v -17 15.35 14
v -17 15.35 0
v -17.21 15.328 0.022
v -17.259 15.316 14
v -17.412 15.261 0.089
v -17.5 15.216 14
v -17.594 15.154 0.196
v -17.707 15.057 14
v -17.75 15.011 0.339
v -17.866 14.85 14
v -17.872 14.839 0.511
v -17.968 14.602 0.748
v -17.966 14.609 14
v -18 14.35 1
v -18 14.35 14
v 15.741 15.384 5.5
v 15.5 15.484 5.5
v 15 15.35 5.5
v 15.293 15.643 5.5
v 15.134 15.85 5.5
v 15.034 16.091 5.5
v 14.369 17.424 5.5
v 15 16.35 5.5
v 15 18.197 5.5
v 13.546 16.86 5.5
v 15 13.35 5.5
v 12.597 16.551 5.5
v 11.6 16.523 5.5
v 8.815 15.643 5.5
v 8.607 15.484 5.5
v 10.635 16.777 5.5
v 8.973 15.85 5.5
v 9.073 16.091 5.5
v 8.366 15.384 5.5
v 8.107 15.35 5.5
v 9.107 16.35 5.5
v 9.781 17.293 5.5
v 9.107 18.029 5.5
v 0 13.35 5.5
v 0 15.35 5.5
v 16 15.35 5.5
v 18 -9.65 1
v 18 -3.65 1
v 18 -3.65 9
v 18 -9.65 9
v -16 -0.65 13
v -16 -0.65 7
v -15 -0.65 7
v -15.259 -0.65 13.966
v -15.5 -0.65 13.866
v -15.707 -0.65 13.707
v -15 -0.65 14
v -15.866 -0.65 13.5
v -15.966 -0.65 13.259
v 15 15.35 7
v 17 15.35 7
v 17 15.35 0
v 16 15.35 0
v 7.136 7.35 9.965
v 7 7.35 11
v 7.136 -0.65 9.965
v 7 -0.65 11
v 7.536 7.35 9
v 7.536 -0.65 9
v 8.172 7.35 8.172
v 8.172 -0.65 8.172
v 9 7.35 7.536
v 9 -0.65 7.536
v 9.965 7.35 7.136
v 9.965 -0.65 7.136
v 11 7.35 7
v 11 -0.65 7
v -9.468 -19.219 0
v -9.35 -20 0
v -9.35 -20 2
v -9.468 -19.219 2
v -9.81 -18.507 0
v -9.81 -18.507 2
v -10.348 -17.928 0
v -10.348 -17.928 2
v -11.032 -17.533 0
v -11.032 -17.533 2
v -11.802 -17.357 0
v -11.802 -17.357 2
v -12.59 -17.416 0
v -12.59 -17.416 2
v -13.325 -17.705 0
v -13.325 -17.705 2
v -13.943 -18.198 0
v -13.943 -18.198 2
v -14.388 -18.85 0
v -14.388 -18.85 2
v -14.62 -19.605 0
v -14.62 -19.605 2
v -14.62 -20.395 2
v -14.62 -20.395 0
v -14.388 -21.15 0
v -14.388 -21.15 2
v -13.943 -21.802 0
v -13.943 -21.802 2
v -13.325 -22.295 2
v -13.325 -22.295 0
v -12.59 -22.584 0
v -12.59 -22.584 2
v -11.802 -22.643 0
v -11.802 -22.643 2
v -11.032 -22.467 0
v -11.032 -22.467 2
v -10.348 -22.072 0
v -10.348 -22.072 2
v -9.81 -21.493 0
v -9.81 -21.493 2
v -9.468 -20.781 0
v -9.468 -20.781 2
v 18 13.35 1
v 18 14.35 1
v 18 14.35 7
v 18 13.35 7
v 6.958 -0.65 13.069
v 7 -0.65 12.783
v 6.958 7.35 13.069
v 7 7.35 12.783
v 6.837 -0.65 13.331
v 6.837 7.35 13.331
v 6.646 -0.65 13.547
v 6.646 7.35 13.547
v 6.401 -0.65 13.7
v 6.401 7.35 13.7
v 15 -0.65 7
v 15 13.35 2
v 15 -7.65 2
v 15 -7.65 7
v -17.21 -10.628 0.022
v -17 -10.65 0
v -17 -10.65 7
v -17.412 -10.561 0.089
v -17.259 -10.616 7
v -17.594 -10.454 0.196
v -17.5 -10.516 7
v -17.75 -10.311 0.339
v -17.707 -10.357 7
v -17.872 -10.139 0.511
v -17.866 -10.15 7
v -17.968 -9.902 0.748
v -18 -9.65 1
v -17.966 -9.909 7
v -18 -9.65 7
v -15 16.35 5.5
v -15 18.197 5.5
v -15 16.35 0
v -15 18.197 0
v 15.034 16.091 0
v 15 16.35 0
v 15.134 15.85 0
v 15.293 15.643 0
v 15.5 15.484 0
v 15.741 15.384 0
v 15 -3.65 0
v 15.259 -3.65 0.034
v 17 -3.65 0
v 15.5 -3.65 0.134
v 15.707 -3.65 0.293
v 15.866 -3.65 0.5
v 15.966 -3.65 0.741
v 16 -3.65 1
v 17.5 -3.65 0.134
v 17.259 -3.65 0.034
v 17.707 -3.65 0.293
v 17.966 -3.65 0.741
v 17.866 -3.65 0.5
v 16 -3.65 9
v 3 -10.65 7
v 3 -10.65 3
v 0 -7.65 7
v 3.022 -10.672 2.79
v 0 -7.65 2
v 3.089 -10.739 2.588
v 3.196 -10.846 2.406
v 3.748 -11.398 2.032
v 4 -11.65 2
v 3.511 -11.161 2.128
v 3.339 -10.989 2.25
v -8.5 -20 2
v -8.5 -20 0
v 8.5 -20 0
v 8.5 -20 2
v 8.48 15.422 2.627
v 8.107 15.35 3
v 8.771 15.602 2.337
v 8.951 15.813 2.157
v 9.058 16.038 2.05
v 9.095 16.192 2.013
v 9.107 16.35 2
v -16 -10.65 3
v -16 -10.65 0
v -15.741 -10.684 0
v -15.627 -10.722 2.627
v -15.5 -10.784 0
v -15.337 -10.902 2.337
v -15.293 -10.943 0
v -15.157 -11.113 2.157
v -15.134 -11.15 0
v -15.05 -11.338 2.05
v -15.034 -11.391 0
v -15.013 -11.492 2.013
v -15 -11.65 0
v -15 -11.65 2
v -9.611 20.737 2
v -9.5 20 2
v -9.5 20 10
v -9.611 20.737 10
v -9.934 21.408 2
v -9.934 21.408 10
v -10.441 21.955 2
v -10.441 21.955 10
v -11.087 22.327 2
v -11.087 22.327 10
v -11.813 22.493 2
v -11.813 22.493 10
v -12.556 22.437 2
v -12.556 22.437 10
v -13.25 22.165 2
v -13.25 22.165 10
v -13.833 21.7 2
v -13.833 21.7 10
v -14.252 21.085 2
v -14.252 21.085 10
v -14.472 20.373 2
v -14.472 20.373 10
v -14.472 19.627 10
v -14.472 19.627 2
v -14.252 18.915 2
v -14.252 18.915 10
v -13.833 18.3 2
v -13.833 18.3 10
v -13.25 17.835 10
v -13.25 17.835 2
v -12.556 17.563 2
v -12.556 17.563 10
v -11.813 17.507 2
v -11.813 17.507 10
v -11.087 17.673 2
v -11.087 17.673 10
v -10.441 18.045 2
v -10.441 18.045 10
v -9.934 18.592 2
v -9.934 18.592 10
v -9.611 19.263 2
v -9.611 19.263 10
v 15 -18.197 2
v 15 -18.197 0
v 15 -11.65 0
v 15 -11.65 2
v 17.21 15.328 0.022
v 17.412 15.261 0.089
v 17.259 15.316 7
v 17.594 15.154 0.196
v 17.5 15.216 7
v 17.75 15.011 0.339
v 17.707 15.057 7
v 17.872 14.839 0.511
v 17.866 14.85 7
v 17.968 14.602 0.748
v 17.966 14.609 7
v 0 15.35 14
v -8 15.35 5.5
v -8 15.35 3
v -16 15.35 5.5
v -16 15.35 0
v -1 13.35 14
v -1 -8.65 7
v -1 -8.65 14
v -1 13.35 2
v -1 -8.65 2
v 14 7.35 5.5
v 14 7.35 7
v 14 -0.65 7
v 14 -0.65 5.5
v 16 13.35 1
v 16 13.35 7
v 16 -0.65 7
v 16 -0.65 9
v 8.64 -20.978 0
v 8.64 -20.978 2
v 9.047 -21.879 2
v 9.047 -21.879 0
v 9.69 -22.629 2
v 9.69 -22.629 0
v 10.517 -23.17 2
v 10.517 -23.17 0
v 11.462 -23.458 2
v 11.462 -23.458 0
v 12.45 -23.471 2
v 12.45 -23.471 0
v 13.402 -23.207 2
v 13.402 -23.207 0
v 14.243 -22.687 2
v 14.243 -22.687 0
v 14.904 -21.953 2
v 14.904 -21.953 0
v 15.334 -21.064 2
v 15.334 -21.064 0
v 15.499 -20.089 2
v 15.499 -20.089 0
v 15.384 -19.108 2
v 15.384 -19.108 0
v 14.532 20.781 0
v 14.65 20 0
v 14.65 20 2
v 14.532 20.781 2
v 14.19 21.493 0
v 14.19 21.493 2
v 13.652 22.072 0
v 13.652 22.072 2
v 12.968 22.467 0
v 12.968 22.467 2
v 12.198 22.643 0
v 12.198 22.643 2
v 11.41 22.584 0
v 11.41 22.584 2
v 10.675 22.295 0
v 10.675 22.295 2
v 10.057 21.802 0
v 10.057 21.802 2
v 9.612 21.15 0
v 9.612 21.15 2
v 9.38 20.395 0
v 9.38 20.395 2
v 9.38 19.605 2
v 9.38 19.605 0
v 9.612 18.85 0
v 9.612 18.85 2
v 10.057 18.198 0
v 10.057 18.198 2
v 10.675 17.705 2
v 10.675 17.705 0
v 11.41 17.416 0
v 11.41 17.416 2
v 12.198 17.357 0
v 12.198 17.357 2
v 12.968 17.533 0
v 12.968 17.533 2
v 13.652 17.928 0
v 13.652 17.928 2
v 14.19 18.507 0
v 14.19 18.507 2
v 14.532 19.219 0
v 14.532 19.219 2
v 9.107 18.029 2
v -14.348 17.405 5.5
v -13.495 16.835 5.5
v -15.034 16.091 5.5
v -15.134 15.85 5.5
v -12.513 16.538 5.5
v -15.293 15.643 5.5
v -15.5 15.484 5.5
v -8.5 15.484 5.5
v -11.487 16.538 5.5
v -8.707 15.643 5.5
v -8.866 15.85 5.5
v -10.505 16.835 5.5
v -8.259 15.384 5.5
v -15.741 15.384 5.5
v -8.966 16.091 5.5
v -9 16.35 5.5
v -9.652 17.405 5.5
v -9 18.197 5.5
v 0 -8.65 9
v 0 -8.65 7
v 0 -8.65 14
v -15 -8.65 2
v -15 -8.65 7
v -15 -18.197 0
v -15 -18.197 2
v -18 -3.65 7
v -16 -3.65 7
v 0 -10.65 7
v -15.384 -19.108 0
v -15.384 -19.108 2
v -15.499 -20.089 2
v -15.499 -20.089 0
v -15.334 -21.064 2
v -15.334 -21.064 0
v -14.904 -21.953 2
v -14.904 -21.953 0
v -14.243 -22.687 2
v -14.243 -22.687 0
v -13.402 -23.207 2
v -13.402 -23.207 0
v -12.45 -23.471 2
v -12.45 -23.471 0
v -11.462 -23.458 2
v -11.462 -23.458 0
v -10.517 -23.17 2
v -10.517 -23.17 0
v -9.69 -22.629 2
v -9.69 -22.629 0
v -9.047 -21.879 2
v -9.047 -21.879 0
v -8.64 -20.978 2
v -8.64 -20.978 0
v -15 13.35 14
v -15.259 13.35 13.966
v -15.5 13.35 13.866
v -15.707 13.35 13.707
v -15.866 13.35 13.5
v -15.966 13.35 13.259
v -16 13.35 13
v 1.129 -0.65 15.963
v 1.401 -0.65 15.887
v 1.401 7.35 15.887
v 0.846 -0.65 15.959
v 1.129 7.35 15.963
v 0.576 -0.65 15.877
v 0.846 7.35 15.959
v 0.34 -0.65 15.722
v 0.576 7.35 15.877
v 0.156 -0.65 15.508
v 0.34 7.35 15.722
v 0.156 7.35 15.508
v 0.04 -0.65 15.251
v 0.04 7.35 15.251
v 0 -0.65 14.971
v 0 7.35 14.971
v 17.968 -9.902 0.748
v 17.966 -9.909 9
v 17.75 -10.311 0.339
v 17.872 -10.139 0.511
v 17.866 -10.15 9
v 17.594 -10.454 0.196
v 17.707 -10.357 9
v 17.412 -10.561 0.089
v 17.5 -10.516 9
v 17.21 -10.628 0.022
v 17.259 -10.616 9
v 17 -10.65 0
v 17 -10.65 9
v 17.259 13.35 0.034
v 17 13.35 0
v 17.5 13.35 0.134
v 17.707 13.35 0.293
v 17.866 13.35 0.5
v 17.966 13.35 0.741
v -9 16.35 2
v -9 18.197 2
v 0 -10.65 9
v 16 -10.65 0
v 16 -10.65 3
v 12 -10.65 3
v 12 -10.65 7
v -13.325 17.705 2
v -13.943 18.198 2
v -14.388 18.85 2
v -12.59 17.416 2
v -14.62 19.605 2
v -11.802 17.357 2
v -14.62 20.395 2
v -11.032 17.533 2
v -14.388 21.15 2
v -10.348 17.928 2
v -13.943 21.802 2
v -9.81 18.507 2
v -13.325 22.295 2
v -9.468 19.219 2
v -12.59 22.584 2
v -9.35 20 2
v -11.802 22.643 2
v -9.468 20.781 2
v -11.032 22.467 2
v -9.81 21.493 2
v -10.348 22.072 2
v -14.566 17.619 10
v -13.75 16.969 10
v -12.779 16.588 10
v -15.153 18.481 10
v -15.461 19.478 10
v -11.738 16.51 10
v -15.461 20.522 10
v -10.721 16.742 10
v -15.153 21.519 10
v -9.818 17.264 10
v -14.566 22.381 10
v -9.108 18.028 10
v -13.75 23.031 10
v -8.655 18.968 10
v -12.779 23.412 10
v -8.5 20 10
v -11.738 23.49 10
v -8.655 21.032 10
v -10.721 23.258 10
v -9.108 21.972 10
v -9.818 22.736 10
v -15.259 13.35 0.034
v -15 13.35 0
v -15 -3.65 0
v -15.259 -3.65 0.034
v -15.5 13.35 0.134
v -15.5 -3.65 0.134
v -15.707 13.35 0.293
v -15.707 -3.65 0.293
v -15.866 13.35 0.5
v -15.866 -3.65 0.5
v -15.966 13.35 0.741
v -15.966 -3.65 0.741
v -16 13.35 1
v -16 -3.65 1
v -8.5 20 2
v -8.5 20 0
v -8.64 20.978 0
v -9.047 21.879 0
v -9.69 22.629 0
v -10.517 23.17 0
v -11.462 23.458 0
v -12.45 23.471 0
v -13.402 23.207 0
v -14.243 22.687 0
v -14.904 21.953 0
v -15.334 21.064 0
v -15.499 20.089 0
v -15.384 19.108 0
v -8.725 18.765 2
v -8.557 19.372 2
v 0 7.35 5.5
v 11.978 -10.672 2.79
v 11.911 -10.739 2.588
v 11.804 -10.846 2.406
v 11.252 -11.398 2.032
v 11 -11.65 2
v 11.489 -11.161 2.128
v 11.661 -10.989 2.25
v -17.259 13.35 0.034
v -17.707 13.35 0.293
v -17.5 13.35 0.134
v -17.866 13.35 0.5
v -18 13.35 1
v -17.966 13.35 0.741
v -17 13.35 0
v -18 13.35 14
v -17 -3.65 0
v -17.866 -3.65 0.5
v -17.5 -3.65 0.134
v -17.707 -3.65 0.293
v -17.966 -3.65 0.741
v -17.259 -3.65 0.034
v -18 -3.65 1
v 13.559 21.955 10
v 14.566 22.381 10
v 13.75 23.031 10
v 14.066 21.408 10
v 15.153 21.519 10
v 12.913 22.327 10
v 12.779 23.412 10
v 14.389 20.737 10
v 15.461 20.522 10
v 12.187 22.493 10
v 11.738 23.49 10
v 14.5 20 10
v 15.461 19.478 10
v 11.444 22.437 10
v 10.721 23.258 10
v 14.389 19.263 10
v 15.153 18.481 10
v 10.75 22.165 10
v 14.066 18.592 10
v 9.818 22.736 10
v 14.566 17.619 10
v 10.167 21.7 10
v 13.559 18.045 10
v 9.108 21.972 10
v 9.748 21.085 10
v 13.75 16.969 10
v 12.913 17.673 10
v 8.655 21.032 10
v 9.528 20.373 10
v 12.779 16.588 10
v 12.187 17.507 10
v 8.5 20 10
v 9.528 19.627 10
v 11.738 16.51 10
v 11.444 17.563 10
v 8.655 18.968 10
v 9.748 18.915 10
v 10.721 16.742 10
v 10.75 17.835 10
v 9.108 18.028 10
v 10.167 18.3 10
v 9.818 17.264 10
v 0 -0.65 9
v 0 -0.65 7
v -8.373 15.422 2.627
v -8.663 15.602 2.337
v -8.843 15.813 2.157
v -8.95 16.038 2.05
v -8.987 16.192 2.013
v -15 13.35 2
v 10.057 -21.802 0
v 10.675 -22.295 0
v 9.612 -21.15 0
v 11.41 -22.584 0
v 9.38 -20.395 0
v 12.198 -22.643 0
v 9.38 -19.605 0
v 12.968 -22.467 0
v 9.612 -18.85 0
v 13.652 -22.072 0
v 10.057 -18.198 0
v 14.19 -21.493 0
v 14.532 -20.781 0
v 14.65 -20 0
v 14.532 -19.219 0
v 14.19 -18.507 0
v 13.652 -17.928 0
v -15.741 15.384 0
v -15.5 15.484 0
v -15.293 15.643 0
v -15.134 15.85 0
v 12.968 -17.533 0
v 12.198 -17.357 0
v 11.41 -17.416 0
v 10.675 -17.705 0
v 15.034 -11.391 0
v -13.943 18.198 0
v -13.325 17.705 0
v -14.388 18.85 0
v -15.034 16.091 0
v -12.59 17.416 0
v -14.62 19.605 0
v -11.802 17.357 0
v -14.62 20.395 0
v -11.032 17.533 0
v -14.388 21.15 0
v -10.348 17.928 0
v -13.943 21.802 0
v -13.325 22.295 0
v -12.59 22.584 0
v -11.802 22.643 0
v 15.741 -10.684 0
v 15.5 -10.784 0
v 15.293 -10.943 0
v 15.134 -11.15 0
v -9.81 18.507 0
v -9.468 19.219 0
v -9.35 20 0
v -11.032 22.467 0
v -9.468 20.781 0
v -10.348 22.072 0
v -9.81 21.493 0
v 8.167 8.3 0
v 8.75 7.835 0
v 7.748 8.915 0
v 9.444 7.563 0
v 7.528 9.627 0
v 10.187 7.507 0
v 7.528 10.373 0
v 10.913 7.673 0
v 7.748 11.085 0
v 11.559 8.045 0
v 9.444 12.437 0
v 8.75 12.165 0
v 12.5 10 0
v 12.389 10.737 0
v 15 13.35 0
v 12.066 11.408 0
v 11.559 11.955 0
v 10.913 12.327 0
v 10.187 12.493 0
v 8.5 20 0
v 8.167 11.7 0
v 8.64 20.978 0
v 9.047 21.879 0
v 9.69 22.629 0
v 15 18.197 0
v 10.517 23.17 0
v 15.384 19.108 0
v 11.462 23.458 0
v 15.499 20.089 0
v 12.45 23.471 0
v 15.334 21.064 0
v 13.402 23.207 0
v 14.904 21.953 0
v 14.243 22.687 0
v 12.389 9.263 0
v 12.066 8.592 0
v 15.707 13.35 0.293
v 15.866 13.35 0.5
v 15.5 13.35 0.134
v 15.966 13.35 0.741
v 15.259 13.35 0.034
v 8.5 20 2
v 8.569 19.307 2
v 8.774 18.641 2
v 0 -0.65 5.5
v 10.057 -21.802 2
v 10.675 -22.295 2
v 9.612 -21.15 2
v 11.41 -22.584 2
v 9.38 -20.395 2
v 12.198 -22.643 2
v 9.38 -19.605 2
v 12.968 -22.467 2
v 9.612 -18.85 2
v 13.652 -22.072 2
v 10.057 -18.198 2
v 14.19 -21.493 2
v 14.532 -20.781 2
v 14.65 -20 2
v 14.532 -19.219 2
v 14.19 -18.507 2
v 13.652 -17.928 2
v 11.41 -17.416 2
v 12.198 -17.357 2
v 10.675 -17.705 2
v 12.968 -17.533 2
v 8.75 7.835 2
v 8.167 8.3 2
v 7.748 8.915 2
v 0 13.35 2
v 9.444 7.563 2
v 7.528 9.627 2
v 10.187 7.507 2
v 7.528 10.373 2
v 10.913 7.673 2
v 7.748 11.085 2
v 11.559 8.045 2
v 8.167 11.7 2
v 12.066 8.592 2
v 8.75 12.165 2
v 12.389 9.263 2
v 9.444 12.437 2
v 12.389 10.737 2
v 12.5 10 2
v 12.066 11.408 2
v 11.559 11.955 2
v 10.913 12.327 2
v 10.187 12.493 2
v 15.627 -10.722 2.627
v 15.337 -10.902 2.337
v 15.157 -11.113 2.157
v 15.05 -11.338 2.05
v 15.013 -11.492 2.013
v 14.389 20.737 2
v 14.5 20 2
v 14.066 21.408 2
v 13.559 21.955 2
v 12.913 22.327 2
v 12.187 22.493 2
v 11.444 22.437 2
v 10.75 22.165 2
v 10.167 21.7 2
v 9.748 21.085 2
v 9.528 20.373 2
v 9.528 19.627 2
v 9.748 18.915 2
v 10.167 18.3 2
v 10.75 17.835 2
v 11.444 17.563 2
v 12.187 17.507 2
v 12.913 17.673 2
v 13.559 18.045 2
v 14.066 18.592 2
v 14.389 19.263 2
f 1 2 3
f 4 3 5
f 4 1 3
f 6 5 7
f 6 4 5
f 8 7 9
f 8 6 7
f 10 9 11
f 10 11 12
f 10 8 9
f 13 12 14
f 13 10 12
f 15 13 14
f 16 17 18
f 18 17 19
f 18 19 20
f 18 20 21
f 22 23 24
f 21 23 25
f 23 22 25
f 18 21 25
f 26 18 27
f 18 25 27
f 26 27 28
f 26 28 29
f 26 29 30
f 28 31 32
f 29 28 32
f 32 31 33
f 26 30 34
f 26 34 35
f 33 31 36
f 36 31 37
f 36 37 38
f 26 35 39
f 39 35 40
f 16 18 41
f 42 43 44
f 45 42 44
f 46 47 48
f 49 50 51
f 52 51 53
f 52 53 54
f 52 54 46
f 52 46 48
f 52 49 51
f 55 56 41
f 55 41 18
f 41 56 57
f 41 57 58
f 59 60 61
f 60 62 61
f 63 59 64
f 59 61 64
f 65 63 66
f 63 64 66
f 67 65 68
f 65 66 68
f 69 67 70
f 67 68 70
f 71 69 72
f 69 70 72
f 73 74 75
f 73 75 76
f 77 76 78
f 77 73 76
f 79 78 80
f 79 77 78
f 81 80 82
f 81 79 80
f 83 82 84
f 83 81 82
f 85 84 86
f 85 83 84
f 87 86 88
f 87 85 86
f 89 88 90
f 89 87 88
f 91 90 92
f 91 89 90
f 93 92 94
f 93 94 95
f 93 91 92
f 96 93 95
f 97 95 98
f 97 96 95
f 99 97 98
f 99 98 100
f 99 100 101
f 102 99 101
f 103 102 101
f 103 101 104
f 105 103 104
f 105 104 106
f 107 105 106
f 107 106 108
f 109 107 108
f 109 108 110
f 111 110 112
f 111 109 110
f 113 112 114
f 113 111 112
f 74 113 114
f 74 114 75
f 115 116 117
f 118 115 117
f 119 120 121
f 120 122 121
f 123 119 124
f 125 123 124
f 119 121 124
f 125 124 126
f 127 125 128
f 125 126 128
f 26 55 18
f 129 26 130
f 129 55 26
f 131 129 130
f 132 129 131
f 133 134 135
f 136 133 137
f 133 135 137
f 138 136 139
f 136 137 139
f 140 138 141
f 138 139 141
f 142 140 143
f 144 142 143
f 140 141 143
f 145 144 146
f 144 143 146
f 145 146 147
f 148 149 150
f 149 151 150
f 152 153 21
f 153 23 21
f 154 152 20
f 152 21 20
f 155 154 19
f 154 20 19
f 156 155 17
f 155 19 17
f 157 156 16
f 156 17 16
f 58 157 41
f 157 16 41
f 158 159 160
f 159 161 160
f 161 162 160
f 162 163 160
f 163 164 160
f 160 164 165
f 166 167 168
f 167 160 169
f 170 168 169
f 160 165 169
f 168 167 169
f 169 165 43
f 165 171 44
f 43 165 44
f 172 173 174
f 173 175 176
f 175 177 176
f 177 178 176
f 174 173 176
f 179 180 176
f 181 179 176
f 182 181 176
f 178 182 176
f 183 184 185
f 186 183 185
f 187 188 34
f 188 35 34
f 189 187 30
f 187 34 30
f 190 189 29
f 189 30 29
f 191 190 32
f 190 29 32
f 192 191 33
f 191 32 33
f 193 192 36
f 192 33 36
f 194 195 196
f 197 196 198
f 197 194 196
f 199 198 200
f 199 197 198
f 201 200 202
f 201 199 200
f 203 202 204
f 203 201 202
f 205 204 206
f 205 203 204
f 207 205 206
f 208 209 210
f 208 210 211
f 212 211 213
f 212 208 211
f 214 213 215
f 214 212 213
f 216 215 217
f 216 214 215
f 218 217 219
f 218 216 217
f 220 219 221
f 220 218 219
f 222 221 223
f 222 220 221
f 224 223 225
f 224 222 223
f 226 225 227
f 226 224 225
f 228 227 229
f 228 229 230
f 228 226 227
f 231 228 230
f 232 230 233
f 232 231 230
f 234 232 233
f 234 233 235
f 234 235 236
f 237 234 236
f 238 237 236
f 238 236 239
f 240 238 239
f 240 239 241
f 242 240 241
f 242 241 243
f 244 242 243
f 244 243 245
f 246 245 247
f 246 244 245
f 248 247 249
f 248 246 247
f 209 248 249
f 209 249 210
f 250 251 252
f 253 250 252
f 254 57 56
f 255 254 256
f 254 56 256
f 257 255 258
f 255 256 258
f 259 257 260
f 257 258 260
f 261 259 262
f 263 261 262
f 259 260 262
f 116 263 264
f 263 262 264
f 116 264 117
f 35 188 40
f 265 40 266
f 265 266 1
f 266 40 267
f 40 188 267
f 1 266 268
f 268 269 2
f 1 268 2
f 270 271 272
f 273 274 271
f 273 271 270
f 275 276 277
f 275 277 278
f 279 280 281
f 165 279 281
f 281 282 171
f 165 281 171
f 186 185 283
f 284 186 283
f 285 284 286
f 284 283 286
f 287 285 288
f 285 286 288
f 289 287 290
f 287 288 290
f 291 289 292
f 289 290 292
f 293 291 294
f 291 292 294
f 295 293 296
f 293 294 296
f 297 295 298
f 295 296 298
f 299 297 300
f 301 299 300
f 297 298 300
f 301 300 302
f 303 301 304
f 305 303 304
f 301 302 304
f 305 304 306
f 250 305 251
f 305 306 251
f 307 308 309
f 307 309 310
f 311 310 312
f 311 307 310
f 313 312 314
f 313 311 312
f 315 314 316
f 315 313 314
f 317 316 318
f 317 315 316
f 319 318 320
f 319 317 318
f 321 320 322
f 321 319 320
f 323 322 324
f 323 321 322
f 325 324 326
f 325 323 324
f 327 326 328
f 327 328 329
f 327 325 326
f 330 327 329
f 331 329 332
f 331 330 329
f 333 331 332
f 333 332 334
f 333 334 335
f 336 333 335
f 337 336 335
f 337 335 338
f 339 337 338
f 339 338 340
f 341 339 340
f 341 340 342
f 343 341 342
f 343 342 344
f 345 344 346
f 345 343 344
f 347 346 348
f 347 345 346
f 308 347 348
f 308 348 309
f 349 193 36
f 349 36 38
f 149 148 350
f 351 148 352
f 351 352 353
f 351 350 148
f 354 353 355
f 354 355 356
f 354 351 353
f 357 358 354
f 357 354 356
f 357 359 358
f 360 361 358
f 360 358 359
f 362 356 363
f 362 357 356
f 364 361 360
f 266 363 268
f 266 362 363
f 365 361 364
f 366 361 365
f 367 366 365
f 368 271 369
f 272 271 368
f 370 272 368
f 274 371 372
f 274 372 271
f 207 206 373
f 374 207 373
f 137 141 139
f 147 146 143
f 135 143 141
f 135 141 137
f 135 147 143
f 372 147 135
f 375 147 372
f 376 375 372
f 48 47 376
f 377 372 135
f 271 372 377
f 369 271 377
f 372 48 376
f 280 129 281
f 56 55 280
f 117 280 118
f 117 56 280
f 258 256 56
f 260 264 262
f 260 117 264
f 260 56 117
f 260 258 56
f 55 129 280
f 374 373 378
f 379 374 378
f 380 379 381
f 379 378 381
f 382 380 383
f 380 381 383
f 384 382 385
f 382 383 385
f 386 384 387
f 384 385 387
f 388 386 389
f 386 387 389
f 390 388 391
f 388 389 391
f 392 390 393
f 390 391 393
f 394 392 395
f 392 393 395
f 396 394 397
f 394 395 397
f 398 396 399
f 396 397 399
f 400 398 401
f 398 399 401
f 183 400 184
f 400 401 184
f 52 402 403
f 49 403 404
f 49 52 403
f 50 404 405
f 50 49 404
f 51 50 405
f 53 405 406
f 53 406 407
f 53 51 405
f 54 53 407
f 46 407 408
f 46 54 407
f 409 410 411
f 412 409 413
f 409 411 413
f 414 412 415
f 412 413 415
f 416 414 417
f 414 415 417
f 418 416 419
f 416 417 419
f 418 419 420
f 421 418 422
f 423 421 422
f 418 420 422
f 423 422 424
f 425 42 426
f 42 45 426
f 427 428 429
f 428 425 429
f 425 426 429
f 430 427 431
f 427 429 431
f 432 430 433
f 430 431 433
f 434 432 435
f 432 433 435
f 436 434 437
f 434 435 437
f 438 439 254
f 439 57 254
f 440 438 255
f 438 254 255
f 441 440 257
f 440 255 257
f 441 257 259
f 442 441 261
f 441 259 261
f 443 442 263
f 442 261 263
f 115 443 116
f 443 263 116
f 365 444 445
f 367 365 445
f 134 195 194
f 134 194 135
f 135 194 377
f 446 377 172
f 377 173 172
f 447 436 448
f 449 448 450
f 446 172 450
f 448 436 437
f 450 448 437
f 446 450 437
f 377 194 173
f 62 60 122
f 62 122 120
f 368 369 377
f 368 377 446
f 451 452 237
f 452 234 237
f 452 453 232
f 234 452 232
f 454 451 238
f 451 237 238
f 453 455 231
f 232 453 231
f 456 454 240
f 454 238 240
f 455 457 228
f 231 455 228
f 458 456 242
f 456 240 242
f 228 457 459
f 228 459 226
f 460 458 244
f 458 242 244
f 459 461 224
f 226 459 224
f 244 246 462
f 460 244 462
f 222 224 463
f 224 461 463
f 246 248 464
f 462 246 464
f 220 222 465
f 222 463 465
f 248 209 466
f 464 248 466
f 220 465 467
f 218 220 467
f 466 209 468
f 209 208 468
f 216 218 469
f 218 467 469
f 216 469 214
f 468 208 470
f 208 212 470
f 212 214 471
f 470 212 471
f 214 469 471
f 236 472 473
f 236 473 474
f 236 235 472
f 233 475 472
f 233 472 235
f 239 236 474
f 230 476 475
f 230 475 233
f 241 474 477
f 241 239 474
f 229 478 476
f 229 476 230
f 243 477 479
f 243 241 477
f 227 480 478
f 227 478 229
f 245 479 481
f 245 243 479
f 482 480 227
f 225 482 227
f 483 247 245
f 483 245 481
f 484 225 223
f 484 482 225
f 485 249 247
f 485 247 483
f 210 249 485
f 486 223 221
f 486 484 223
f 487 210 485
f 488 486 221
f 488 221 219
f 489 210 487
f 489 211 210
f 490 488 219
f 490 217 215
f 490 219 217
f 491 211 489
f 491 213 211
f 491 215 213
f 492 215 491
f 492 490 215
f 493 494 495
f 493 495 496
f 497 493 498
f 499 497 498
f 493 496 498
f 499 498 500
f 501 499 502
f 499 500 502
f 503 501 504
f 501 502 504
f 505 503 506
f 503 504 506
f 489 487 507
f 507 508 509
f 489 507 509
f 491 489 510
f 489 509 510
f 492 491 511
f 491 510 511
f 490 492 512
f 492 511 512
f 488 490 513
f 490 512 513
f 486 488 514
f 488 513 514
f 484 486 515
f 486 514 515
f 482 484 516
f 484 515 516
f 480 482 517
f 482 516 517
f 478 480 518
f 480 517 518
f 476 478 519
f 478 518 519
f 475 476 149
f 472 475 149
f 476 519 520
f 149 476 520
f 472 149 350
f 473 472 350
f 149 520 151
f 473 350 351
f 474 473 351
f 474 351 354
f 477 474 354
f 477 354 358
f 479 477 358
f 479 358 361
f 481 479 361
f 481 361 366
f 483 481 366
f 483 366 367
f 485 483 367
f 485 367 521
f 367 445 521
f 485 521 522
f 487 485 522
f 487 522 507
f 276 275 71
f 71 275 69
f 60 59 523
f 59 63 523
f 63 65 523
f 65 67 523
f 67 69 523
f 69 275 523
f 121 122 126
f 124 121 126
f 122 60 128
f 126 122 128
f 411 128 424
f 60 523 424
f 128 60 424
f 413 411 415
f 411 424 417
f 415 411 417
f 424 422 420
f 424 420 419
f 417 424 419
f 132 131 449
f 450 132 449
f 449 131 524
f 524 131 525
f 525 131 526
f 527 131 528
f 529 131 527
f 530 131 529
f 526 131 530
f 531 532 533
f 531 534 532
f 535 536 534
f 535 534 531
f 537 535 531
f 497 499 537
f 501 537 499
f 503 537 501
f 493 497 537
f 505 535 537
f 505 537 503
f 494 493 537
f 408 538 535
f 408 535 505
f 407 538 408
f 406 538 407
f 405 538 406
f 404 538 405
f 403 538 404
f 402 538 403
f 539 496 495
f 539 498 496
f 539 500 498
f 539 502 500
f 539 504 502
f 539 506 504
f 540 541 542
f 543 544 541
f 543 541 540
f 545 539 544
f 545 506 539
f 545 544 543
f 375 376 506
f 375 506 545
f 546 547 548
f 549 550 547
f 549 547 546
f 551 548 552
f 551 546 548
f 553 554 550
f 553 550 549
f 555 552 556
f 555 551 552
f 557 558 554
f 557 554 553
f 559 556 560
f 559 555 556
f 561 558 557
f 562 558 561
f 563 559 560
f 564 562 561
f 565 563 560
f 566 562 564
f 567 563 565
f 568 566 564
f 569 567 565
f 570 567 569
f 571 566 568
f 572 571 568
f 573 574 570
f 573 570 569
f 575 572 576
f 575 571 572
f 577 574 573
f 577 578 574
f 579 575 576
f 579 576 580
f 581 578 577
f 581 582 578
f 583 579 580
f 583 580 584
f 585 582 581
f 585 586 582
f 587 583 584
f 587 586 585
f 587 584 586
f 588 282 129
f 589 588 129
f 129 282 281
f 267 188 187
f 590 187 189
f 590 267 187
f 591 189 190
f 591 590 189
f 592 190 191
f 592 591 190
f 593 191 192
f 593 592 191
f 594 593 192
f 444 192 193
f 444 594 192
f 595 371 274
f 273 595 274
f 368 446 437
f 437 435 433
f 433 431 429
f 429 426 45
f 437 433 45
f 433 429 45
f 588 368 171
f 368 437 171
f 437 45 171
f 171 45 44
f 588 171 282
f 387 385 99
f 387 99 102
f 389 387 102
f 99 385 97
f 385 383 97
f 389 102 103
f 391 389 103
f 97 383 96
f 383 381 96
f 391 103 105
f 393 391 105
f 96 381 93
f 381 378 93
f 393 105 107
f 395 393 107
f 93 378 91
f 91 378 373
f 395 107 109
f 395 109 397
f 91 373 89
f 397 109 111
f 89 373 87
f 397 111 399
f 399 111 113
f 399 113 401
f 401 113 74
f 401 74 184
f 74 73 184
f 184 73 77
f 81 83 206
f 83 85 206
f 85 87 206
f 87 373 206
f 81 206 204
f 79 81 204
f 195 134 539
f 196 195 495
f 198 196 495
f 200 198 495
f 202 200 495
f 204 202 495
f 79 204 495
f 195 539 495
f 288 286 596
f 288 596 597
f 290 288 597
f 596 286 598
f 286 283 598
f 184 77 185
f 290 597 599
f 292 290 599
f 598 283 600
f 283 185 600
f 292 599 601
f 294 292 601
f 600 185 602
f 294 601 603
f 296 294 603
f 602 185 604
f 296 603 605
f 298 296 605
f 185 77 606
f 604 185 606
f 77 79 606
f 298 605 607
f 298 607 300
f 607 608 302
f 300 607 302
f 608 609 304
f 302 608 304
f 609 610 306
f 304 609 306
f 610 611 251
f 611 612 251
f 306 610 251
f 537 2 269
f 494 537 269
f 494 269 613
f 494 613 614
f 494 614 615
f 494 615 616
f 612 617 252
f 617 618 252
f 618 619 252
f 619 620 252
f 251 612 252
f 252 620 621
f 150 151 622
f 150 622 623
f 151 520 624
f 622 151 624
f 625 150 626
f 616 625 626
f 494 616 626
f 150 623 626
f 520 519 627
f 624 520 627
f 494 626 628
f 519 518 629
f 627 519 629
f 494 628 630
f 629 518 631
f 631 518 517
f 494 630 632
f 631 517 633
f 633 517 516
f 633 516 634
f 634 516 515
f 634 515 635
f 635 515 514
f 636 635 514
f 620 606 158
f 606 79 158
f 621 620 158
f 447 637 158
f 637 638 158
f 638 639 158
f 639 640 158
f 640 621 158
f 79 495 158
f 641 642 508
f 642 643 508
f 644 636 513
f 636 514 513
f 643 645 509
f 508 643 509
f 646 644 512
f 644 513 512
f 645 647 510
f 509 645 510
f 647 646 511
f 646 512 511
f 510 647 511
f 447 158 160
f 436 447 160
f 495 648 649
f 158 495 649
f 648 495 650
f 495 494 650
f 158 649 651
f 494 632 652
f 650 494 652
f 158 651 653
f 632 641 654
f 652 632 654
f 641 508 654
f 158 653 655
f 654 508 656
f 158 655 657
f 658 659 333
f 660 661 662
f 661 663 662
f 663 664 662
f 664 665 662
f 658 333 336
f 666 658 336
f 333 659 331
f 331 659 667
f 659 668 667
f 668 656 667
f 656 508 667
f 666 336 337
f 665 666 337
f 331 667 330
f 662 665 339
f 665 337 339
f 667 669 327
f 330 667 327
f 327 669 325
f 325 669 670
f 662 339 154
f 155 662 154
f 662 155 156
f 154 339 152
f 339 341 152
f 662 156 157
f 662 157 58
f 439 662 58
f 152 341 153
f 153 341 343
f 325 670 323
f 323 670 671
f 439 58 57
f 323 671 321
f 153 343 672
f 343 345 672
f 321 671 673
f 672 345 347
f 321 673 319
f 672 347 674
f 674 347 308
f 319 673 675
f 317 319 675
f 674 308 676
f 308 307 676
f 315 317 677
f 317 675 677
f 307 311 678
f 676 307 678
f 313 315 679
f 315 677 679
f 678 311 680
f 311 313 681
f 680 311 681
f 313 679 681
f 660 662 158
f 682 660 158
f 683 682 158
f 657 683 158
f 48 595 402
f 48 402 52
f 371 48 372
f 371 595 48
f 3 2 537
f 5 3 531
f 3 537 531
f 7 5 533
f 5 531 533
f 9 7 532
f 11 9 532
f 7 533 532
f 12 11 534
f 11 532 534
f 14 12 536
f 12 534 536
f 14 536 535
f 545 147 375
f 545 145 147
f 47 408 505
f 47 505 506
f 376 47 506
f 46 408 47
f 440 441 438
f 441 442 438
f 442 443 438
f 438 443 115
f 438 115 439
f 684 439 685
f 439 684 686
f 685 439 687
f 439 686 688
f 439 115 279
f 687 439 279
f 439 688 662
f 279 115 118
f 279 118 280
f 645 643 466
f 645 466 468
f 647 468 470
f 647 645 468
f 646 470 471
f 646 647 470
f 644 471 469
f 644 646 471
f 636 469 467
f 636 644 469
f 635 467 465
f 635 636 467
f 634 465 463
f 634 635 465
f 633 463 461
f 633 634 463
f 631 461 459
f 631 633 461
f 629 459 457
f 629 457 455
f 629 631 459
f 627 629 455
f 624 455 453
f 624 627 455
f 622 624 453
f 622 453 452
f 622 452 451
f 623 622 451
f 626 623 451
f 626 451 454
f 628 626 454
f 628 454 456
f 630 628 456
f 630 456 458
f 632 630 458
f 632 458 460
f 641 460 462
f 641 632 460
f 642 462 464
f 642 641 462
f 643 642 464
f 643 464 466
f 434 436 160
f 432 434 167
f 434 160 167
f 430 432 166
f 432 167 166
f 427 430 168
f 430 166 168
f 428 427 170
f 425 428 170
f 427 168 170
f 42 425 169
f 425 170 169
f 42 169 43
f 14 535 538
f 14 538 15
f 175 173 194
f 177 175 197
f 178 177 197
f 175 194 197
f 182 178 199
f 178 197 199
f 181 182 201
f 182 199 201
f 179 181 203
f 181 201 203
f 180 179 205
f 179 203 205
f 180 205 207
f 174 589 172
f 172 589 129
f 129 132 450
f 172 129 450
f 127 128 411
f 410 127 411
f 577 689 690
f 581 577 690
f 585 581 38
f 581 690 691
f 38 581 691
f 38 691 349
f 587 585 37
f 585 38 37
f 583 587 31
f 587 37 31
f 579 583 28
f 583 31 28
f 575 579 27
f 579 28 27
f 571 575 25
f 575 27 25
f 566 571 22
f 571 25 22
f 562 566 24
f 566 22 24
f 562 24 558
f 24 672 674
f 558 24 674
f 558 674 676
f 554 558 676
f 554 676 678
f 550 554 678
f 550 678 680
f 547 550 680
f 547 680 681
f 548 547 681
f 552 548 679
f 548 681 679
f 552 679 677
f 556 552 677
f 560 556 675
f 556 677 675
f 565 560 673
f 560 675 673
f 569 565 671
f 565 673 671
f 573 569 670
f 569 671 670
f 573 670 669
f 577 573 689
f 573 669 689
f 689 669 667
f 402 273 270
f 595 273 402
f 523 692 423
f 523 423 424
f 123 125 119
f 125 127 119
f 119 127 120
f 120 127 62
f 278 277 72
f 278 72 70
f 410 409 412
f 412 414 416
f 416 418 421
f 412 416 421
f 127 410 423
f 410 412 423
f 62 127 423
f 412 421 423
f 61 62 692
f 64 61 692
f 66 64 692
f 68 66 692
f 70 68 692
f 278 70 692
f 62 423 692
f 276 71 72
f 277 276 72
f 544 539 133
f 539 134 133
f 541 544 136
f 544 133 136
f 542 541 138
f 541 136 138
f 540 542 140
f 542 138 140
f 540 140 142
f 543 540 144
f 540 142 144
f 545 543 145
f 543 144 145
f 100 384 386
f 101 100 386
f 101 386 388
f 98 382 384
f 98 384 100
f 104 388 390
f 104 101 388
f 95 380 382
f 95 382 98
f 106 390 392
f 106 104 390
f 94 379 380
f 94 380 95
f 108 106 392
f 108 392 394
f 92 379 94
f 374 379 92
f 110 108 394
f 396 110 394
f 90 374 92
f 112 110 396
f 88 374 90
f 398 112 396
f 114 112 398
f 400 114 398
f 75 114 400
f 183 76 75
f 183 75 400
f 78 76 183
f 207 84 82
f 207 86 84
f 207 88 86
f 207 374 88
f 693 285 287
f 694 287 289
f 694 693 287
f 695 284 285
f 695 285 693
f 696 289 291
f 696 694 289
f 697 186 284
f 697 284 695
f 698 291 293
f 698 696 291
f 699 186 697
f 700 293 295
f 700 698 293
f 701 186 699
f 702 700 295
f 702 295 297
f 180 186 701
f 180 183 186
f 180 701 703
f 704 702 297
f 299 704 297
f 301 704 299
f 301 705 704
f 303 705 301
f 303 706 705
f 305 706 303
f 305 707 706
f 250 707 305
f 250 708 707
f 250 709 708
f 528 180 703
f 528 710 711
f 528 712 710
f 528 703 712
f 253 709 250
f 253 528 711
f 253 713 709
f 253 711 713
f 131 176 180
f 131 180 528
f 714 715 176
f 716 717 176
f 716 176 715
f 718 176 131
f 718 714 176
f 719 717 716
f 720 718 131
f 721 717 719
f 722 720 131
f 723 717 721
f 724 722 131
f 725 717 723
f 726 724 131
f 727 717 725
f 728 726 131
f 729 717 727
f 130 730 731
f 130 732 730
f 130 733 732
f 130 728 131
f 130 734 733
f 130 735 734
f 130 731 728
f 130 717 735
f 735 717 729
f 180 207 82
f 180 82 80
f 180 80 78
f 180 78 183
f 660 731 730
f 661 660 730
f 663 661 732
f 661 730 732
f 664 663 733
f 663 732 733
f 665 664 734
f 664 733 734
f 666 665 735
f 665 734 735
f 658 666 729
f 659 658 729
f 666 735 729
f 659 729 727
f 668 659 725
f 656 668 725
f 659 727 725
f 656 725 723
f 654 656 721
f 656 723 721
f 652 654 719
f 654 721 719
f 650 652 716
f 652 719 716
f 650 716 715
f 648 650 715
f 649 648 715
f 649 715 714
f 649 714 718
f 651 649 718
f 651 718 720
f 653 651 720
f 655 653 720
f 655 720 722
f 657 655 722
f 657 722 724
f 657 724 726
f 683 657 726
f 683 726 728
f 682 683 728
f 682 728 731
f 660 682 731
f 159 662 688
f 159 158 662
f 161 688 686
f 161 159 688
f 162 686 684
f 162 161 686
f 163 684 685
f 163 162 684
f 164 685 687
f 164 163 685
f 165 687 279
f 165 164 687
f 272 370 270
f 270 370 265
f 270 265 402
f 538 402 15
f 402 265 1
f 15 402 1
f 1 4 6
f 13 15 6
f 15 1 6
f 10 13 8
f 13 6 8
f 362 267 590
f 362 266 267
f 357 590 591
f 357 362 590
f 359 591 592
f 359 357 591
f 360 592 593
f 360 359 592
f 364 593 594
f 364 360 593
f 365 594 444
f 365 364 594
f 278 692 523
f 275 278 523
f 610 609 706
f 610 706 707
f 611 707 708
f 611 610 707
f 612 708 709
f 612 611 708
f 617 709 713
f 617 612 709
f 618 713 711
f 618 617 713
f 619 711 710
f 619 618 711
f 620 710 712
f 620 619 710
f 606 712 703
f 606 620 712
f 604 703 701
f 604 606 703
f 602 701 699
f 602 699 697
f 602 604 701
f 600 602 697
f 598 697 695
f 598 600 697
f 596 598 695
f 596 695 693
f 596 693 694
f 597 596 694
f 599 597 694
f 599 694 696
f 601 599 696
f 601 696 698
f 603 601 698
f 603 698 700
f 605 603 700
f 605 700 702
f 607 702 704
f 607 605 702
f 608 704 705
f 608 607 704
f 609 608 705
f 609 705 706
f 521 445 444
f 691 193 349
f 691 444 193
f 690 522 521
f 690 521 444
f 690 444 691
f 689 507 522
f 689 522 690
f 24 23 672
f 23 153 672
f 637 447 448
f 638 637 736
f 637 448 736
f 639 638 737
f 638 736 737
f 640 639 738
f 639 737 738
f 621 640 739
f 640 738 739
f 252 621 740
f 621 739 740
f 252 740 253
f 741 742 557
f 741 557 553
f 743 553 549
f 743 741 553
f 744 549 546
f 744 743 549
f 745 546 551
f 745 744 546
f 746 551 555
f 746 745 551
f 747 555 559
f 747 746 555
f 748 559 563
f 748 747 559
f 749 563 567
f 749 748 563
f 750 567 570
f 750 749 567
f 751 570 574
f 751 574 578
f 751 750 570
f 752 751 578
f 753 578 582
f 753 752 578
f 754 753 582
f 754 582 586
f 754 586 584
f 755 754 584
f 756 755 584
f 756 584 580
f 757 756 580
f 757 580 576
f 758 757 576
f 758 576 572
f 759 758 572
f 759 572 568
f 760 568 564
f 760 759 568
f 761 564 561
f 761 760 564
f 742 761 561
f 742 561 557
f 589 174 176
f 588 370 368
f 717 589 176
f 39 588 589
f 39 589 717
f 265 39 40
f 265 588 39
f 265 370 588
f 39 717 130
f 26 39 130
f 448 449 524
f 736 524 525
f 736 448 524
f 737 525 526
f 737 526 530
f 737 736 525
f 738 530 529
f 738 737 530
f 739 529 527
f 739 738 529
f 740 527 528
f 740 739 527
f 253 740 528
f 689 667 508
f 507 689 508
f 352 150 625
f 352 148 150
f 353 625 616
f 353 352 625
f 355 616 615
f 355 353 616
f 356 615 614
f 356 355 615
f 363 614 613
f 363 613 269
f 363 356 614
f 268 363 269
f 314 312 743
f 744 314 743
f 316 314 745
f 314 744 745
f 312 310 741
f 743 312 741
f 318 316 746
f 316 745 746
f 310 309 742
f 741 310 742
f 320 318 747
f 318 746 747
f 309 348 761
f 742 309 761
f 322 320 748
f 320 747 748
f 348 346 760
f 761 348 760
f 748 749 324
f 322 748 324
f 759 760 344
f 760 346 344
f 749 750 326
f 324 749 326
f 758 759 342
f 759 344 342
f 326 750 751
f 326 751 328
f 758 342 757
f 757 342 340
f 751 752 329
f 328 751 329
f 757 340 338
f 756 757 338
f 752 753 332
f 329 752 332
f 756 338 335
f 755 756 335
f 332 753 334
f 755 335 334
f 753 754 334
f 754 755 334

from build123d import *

# Parameters (mm, degrees)
SKETCH1_R            = 2.65
SKETCH1_R_2          = 2.650000000000013
BOSS_EXTRUDE1_DEPTH  = 2
BOSS_EXTRUDE2_DEPTH  = 12
CUT_EXTRUDE1_DEPTH   = 7
BOSS_EXTRUDE3_DEPTH  = 5
SKETCH6_R            = 3.4999999999999982
SKETCH6_R_2          = 2.4999999999999996
SKETCH6_R_3          = 3.4999999999999996
SKETCH6_R_4          = 2.4999999999999964
BOSS_EXTRUDE4_DEPTH  = 8
BOSS_EXTRUDE5_DEPTH  = 18
BOSS_EXTRUDE6_DEPTH  = 3.5
CUT_EXTRUDE2_DEPTH   = 1.5
SKETCH10_R           = 2.5000000000000004
CUT_EXTRUDE3_DEPTH   = 32.94135250736888
CUT_EXTRUDE4_DEPTH   = 33.74522866006589
FILLET1_R            = 1
BOSS_EXTRUDE7_DEPTH  = 11
CUT_EXTRUDE5_DEPTH   = 8
FILLET2_R            = 1
BOSS_EXTRUDE18_DEPTH = 7
FILLET3_R            = 4


with BuildPart() as part:
    # Sketch1 → Boss-Extrude1 (new body)
    with BuildSketch(Plane.XY):
        with BuildLine():
            Line((-14.999999999999993, 18.19722436226799), (-14.999999999999996, 15.350000000000001))
            Line((-14.999999999999996, 15.350000000000001), (-17.999999999999993, 15.350000000000001))
            Line((-17.999999999999993, 15.350000000000001), (-17.999999999999993, -10.649999999999999))
            Line((-17.999999999999993, -10.649999999999999), (-14.999999999999993, -10.649999999999999))
            Line((-14.999999999999993, -10.649999999999999), (-15.000000000000004, -18.197224362268003))
            ThreePointArc((-15.000000000000004, -18.197224362268003), (-12.935414346693491, -23.372684390808004), (-8.500000000000004, -20))
            Line((-8.500000000000004, -20), (8.499999999999996, -20))
            ThreePointArc((8.499999999999996, -20), (12.935414346693465, -23.37268439080802), (15.00000000000001, -18.197224362268035))
            Line((15.00000000000001, -18.197224362268035), (15.000000000000007, -10.649999999999995))
            Line((15.000000000000007, -10.649999999999995), (18.000000000000004, -10.649999999999995))
            Line((18.000000000000004, -10.649999999999995), (18.000000000000007, 15.350000000000005))
            Line((18.000000000000007, 15.350000000000005), (15.000000000000007, 15.350000000000005))
            Line((15.000000000000007, 15.350000000000005), (15.000000000000007, 18.197224362268017))
            ThreePointArc((15.000000000000007, 18.197224362268017), (12.935414346693479, 23.37268439080801), (8.5, 20))
            Line((8.5, 20), (-8.500000000000005, 19.999999999999996))
            ThreePointArc((-8.500000000000005, 19.999999999999996), (-12.935414346693495, 23.372684390808008), (-14.999999999999993, 18.19722436226799))
        make_face()
        with Locations((12, 20)):
            Circle(SKETCH1_R, mode=Mode.SUBTRACT)
        with Locations((11.999999999999996, -20.000000000000004)):
            Circle(SKETCH1_R, mode=Mode.SUBTRACT)
        with Locations((-12.000000000000004, 20)):
            Circle(SKETCH1_R, mode=Mode.SUBTRACT)
        with Locations((-12.000000000000004, -19.999999999999996)):
            Circle(SKETCH1_R_2, mode=Mode.SUBTRACT)
    extrude(amount=BOSS_EXTRUDE1_DEPTH)

    # Sketch2 → Boss-Extrude2 (add)
    with BuildSketch(Plane.XY.offset(2)):
        Polygon((-17.999999999999993, 15.350000000000001), (0, 15.350000000000001), (2.4e-16, 13.500000000000002), (2.82e-15, -7.499999999999996), (3.18e-15, -10.649999999999997), (-17.999999999999993, -10.649999999999999), align=None)
        Polygon((-0.9999999999999972, 13.350000000000001), (-14.99999999999999, 13.35), (-14.99999999999999, -8.649999999999999), (-0.9999999999999974, -8.649999999999999), align=None, mode=Mode.SUBTRACT)
    extrude(amount=BOSS_EXTRUDE2_DEPTH)

    # Sketch3 → Cut-Extrude1 (cut)
    with BuildSketch(Plane.XY.offset(14)):
        Polygon((-17.999999999999996, -0.6499999999999978), (-14.99999999999999, -0.6499999999999978), (-14.99999999999999, -8.649999999999999), (0, -8.649999999999999), (3.18e-15, -10.649999999999997), (-17.999999999999993, -10.649999999999999), align=None)
    extrude(amount=-CUT_EXTRUDE1_DEPTH, mode=Mode.SUBTRACT)

    # Sketch4 → Boss-Extrude3 (add)
    with BuildSketch(Plane.XY.offset(2)):
        Polygon((18.000000000000004, -10.649999999999995), (18.000000000000007, 15.350000000000005), (15.000000000000007, 15.350000000000005), (0, 15.350000000000001), (2.5e-16, 13.350000000000003), (15.000000000000004, 13.350000000000003), (15.000000000000007, -7.649999999999994), (12.000000000000007, -10.649999999999995), align=None)
        Polygon((3.18e-15, -10.649999999999997), (3.000000000000003, -10.649999999999997), (0, -7.649999999999994), align=None)
    extrude(amount=BOSS_EXTRUDE3_DEPTH)

    # Sketch6 → Boss-Extrude4 (add)
    # profile 1 of 2: a face of its own
    with BuildSketch(Plane.XY.offset(2)):
        with Locations(Location((12, 20, 0), (0, 0, 180))):
            Circle(SKETCH6_R)
        with Locations((12, 20)):
            Circle(SKETCH6_R_2, mode=Mode.SUBTRACT)
    # profile 2 of 2: a face of its own
    with BuildSketch(Plane.XY.offset(2)):
        with Locations((-12.000000000000004, 20)):
            Circle(SKETCH6_R_3)
        with Locations((-12.000000000000004, 20)):
            Circle(SKETCH6_R_4, mode=Mode.SUBTRACT)
    extrude(amount=BOSS_EXTRUDE4_DEPTH)

    # Sketch7 → Boss-Extrude5 (add)
    with BuildSketch(Plane(origin=(18.000000000000004, -2.4e-15, 0), x_dir=(0, 0, -1), z_dir=(1, -1.3e-16, 0))):
        Polygon((-7, -10.649999999999993), (-9.000000000000002, -10.649999999999997), (-9.000000000000002, -0.649999999999996), (-7, -0.649999999999996), align=None)
    extrude(amount=-BOSS_EXTRUDE5_DEPTH)

    # Sketch8 → Boss-Extrude6 (add)
    with BuildSketch(Plane.XY.offset(2)):
        with BuildLine():
            Line((-14.999999999999993, 18.19722436226799), (-14.999999999999996, 15.350000000000001))
            Line((-14.999999999999996, 15.350000000000001), (-9.000000000000005, 15.350000000000005))
            Line((-9.000000000000005, 15.350000000000005), (-9.000000000000005, 18.197224362268006))
            ThreePointArc((-9.000000000000005, 18.197224362268006), (-11.999999999999993, 16.5), (-14.999999999999993, 18.19722436226799))
        make_face()
        with BuildLine():
            Line((15.000000000000005, 18.197224362268017), (15.000000000000007, 15.350000000000005))
            Line((15.000000000000007, 15.350000000000005), (9.107416754268383, 15.350000000000005))
            Line((9.107416754268383, 15.350000000000005), (9.107416754268383, 18.02947667699346))
            ThreePointArc((9.107416754268383, 18.02947667699346), (12.099596241159652, 16.501417345731724), (15.000000000000005, 18.197224362268017))
        make_face()
    extrude(amount=BOSS_EXTRUDE6_DEPTH)

    # Sketch9 → Cut-Extrude2 (cut)
    with BuildSketch(Plane.XY.offset(7)):
        Polygon((0, 15.350000000000001), (15.000000000000004, 15.350000000000001), (15.000000000000004, 13.350000000000003), (2.5e-16, 13.350000000000003), align=None)
    extrude(amount=-CUT_EXTRUDE2_DEPTH, mode=Mode.SUBTRACT)

    # Sketch10 → Cut-Extrude3 (cut, through all)
    with BuildSketch(Plane.XY.offset(2)):
        with Locations((10, 10)):
            Circle(SKETCH10_R)
    extrude(amount=-CUT_EXTRUDE3_DEPTH, mode=Mode.SUBTRACT)

    # Sketch11 → Cut-Extrude4 (cut, through all)
    with BuildSketch(Plane.XY.offset(14)):
        Polygon((-17.999999999999993, 13.350000000000001), (-15.999999999999986, 13.350000000000001), (-15.999999999999986, -3.6500000000000004), (-17.99999999999999, -3.6500000000000004), align=None)
        Polygon((18.000000000000004, 13.350000000000003), (16, 13.350000000000005), (16.000000000000007, -3.649999999999997), (18.000000000000007, -3.649999999999997), align=None)
    extrude(amount=-CUT_EXTRUDE4_DEPTH, mode=Mode.SUBTRACT)

    # Fillet1
    fillet1_edges = [part.edges().sort_by_distance(p)[0] for p in [
        (13.500000000000007, -10.649999999999995, 2),
        (18.000000000000004, -7.149999999999996, 0),
        (-9.000000000000005, 15.350000000000005, 3.75),
        (0.0537083771341873, 15.350000000000003, 2),
        (9.107416754268383, 15.350000000000005, 3.75),
        (-17.999999999999993, 14.350000000000001, 0),
        (18.000000000000007, 14.350000000000005, 0),
        (-17.999999999999993, -7.149999999999999, 0),
        (-15.999999999999986, 6.350000000000001, 14),
        (-15.999999999999986, 4.850000000000001, 0),
        (16.000000000000004, 4.850000000000005, 0),
        (-14.999999999999996, 15.350000000000001, 2.75),
        (15.000000000000007, 15.350000000000005, 2.75),
        (18.000000000000007, 15.350000000000005, 3.5),
        (18.000000000000004, -10.649999999999997, 4.500000000000001),
        (15.000000000000007, -10.649999999999995, 1),
        (-14.999999999999993, -10.649999999999999, 1),
        (-17.999999999999993, 15.350000000000001, 7),
        (-5.999999999999995, -10.649999999999999, 2),
        (-17.999999999999993, -10.649999999999999, 3.5),
    ]]
    fillet(fillet1_edges, radius=FILLET1_R)


with BuildPart() as body_2:
    # Sketch12 → Boss-Extrude7 (new body)
    with BuildSketch(Plane.XY.offset(5.5)):
        Polygon((3.05e-15, 7.350000000000004), (7.0000000000000036, 7.350000000000004), (7.0000000000000036, -0.649999999999996), (2.7e-16, -0.6499999999999972), align=None)
    extrude(amount=BOSS_EXTRUDE7_DEPTH)

    # Sketch16 → Cut-Extrude5 (cut)
    with BuildSketch(Plane(origin=(0, 7.350000000000004, 0), x_dir=(1, 0, 0), z_dir=(0, 1, 0))):
        Polygon((16.000000000000007, -9.500000000000002), (3.05e-15, -16.5), (16.000000000000007, -16.5), align=None)
    extrude(amount=-CUT_EXTRUDE5_DEPTH, mode=Mode.SUBTRACT)

    # Fillet2
    fillet2_edges = [body_2.edges().sort_by_distance(p)[0] for p in [
        (7.0000000000000036, 3.350000000000004, 13.437500000000002),
        (1.66e-15, 3.3500000000000036, 16.5),
    ]]
    fillet(fillet2_edges, radius=FILLET2_R)

    # Sketch19 → Boss-Extrude18 (add)
    with BuildSketch(Plane(origin=(7.0000000000000036, 0, 0), x_dir=(0, 0, -1), z_dir=(1, 0, 0))):
        Polygon((-5.5, 7.350000000000004), (-6.999999999999999, 7.350000000000004), (-6.999999999999998, -0.649999999999996), (-5.499999999999999, -0.649999999999996), align=None)
    extrude(amount=BOSS_EXTRUDE18_DEPTH)

    # Fillet3
    fillet3_edges = [body_2.edges().sort_by_distance(p)[0] for p in [
        (7.0000000000000036, 3.350000000000004, 6.999999999999998),
    ]]
    fillet(fillet3_edges, radius=FILLET3_R)


solid = Compound([part.part, body_2.part])
